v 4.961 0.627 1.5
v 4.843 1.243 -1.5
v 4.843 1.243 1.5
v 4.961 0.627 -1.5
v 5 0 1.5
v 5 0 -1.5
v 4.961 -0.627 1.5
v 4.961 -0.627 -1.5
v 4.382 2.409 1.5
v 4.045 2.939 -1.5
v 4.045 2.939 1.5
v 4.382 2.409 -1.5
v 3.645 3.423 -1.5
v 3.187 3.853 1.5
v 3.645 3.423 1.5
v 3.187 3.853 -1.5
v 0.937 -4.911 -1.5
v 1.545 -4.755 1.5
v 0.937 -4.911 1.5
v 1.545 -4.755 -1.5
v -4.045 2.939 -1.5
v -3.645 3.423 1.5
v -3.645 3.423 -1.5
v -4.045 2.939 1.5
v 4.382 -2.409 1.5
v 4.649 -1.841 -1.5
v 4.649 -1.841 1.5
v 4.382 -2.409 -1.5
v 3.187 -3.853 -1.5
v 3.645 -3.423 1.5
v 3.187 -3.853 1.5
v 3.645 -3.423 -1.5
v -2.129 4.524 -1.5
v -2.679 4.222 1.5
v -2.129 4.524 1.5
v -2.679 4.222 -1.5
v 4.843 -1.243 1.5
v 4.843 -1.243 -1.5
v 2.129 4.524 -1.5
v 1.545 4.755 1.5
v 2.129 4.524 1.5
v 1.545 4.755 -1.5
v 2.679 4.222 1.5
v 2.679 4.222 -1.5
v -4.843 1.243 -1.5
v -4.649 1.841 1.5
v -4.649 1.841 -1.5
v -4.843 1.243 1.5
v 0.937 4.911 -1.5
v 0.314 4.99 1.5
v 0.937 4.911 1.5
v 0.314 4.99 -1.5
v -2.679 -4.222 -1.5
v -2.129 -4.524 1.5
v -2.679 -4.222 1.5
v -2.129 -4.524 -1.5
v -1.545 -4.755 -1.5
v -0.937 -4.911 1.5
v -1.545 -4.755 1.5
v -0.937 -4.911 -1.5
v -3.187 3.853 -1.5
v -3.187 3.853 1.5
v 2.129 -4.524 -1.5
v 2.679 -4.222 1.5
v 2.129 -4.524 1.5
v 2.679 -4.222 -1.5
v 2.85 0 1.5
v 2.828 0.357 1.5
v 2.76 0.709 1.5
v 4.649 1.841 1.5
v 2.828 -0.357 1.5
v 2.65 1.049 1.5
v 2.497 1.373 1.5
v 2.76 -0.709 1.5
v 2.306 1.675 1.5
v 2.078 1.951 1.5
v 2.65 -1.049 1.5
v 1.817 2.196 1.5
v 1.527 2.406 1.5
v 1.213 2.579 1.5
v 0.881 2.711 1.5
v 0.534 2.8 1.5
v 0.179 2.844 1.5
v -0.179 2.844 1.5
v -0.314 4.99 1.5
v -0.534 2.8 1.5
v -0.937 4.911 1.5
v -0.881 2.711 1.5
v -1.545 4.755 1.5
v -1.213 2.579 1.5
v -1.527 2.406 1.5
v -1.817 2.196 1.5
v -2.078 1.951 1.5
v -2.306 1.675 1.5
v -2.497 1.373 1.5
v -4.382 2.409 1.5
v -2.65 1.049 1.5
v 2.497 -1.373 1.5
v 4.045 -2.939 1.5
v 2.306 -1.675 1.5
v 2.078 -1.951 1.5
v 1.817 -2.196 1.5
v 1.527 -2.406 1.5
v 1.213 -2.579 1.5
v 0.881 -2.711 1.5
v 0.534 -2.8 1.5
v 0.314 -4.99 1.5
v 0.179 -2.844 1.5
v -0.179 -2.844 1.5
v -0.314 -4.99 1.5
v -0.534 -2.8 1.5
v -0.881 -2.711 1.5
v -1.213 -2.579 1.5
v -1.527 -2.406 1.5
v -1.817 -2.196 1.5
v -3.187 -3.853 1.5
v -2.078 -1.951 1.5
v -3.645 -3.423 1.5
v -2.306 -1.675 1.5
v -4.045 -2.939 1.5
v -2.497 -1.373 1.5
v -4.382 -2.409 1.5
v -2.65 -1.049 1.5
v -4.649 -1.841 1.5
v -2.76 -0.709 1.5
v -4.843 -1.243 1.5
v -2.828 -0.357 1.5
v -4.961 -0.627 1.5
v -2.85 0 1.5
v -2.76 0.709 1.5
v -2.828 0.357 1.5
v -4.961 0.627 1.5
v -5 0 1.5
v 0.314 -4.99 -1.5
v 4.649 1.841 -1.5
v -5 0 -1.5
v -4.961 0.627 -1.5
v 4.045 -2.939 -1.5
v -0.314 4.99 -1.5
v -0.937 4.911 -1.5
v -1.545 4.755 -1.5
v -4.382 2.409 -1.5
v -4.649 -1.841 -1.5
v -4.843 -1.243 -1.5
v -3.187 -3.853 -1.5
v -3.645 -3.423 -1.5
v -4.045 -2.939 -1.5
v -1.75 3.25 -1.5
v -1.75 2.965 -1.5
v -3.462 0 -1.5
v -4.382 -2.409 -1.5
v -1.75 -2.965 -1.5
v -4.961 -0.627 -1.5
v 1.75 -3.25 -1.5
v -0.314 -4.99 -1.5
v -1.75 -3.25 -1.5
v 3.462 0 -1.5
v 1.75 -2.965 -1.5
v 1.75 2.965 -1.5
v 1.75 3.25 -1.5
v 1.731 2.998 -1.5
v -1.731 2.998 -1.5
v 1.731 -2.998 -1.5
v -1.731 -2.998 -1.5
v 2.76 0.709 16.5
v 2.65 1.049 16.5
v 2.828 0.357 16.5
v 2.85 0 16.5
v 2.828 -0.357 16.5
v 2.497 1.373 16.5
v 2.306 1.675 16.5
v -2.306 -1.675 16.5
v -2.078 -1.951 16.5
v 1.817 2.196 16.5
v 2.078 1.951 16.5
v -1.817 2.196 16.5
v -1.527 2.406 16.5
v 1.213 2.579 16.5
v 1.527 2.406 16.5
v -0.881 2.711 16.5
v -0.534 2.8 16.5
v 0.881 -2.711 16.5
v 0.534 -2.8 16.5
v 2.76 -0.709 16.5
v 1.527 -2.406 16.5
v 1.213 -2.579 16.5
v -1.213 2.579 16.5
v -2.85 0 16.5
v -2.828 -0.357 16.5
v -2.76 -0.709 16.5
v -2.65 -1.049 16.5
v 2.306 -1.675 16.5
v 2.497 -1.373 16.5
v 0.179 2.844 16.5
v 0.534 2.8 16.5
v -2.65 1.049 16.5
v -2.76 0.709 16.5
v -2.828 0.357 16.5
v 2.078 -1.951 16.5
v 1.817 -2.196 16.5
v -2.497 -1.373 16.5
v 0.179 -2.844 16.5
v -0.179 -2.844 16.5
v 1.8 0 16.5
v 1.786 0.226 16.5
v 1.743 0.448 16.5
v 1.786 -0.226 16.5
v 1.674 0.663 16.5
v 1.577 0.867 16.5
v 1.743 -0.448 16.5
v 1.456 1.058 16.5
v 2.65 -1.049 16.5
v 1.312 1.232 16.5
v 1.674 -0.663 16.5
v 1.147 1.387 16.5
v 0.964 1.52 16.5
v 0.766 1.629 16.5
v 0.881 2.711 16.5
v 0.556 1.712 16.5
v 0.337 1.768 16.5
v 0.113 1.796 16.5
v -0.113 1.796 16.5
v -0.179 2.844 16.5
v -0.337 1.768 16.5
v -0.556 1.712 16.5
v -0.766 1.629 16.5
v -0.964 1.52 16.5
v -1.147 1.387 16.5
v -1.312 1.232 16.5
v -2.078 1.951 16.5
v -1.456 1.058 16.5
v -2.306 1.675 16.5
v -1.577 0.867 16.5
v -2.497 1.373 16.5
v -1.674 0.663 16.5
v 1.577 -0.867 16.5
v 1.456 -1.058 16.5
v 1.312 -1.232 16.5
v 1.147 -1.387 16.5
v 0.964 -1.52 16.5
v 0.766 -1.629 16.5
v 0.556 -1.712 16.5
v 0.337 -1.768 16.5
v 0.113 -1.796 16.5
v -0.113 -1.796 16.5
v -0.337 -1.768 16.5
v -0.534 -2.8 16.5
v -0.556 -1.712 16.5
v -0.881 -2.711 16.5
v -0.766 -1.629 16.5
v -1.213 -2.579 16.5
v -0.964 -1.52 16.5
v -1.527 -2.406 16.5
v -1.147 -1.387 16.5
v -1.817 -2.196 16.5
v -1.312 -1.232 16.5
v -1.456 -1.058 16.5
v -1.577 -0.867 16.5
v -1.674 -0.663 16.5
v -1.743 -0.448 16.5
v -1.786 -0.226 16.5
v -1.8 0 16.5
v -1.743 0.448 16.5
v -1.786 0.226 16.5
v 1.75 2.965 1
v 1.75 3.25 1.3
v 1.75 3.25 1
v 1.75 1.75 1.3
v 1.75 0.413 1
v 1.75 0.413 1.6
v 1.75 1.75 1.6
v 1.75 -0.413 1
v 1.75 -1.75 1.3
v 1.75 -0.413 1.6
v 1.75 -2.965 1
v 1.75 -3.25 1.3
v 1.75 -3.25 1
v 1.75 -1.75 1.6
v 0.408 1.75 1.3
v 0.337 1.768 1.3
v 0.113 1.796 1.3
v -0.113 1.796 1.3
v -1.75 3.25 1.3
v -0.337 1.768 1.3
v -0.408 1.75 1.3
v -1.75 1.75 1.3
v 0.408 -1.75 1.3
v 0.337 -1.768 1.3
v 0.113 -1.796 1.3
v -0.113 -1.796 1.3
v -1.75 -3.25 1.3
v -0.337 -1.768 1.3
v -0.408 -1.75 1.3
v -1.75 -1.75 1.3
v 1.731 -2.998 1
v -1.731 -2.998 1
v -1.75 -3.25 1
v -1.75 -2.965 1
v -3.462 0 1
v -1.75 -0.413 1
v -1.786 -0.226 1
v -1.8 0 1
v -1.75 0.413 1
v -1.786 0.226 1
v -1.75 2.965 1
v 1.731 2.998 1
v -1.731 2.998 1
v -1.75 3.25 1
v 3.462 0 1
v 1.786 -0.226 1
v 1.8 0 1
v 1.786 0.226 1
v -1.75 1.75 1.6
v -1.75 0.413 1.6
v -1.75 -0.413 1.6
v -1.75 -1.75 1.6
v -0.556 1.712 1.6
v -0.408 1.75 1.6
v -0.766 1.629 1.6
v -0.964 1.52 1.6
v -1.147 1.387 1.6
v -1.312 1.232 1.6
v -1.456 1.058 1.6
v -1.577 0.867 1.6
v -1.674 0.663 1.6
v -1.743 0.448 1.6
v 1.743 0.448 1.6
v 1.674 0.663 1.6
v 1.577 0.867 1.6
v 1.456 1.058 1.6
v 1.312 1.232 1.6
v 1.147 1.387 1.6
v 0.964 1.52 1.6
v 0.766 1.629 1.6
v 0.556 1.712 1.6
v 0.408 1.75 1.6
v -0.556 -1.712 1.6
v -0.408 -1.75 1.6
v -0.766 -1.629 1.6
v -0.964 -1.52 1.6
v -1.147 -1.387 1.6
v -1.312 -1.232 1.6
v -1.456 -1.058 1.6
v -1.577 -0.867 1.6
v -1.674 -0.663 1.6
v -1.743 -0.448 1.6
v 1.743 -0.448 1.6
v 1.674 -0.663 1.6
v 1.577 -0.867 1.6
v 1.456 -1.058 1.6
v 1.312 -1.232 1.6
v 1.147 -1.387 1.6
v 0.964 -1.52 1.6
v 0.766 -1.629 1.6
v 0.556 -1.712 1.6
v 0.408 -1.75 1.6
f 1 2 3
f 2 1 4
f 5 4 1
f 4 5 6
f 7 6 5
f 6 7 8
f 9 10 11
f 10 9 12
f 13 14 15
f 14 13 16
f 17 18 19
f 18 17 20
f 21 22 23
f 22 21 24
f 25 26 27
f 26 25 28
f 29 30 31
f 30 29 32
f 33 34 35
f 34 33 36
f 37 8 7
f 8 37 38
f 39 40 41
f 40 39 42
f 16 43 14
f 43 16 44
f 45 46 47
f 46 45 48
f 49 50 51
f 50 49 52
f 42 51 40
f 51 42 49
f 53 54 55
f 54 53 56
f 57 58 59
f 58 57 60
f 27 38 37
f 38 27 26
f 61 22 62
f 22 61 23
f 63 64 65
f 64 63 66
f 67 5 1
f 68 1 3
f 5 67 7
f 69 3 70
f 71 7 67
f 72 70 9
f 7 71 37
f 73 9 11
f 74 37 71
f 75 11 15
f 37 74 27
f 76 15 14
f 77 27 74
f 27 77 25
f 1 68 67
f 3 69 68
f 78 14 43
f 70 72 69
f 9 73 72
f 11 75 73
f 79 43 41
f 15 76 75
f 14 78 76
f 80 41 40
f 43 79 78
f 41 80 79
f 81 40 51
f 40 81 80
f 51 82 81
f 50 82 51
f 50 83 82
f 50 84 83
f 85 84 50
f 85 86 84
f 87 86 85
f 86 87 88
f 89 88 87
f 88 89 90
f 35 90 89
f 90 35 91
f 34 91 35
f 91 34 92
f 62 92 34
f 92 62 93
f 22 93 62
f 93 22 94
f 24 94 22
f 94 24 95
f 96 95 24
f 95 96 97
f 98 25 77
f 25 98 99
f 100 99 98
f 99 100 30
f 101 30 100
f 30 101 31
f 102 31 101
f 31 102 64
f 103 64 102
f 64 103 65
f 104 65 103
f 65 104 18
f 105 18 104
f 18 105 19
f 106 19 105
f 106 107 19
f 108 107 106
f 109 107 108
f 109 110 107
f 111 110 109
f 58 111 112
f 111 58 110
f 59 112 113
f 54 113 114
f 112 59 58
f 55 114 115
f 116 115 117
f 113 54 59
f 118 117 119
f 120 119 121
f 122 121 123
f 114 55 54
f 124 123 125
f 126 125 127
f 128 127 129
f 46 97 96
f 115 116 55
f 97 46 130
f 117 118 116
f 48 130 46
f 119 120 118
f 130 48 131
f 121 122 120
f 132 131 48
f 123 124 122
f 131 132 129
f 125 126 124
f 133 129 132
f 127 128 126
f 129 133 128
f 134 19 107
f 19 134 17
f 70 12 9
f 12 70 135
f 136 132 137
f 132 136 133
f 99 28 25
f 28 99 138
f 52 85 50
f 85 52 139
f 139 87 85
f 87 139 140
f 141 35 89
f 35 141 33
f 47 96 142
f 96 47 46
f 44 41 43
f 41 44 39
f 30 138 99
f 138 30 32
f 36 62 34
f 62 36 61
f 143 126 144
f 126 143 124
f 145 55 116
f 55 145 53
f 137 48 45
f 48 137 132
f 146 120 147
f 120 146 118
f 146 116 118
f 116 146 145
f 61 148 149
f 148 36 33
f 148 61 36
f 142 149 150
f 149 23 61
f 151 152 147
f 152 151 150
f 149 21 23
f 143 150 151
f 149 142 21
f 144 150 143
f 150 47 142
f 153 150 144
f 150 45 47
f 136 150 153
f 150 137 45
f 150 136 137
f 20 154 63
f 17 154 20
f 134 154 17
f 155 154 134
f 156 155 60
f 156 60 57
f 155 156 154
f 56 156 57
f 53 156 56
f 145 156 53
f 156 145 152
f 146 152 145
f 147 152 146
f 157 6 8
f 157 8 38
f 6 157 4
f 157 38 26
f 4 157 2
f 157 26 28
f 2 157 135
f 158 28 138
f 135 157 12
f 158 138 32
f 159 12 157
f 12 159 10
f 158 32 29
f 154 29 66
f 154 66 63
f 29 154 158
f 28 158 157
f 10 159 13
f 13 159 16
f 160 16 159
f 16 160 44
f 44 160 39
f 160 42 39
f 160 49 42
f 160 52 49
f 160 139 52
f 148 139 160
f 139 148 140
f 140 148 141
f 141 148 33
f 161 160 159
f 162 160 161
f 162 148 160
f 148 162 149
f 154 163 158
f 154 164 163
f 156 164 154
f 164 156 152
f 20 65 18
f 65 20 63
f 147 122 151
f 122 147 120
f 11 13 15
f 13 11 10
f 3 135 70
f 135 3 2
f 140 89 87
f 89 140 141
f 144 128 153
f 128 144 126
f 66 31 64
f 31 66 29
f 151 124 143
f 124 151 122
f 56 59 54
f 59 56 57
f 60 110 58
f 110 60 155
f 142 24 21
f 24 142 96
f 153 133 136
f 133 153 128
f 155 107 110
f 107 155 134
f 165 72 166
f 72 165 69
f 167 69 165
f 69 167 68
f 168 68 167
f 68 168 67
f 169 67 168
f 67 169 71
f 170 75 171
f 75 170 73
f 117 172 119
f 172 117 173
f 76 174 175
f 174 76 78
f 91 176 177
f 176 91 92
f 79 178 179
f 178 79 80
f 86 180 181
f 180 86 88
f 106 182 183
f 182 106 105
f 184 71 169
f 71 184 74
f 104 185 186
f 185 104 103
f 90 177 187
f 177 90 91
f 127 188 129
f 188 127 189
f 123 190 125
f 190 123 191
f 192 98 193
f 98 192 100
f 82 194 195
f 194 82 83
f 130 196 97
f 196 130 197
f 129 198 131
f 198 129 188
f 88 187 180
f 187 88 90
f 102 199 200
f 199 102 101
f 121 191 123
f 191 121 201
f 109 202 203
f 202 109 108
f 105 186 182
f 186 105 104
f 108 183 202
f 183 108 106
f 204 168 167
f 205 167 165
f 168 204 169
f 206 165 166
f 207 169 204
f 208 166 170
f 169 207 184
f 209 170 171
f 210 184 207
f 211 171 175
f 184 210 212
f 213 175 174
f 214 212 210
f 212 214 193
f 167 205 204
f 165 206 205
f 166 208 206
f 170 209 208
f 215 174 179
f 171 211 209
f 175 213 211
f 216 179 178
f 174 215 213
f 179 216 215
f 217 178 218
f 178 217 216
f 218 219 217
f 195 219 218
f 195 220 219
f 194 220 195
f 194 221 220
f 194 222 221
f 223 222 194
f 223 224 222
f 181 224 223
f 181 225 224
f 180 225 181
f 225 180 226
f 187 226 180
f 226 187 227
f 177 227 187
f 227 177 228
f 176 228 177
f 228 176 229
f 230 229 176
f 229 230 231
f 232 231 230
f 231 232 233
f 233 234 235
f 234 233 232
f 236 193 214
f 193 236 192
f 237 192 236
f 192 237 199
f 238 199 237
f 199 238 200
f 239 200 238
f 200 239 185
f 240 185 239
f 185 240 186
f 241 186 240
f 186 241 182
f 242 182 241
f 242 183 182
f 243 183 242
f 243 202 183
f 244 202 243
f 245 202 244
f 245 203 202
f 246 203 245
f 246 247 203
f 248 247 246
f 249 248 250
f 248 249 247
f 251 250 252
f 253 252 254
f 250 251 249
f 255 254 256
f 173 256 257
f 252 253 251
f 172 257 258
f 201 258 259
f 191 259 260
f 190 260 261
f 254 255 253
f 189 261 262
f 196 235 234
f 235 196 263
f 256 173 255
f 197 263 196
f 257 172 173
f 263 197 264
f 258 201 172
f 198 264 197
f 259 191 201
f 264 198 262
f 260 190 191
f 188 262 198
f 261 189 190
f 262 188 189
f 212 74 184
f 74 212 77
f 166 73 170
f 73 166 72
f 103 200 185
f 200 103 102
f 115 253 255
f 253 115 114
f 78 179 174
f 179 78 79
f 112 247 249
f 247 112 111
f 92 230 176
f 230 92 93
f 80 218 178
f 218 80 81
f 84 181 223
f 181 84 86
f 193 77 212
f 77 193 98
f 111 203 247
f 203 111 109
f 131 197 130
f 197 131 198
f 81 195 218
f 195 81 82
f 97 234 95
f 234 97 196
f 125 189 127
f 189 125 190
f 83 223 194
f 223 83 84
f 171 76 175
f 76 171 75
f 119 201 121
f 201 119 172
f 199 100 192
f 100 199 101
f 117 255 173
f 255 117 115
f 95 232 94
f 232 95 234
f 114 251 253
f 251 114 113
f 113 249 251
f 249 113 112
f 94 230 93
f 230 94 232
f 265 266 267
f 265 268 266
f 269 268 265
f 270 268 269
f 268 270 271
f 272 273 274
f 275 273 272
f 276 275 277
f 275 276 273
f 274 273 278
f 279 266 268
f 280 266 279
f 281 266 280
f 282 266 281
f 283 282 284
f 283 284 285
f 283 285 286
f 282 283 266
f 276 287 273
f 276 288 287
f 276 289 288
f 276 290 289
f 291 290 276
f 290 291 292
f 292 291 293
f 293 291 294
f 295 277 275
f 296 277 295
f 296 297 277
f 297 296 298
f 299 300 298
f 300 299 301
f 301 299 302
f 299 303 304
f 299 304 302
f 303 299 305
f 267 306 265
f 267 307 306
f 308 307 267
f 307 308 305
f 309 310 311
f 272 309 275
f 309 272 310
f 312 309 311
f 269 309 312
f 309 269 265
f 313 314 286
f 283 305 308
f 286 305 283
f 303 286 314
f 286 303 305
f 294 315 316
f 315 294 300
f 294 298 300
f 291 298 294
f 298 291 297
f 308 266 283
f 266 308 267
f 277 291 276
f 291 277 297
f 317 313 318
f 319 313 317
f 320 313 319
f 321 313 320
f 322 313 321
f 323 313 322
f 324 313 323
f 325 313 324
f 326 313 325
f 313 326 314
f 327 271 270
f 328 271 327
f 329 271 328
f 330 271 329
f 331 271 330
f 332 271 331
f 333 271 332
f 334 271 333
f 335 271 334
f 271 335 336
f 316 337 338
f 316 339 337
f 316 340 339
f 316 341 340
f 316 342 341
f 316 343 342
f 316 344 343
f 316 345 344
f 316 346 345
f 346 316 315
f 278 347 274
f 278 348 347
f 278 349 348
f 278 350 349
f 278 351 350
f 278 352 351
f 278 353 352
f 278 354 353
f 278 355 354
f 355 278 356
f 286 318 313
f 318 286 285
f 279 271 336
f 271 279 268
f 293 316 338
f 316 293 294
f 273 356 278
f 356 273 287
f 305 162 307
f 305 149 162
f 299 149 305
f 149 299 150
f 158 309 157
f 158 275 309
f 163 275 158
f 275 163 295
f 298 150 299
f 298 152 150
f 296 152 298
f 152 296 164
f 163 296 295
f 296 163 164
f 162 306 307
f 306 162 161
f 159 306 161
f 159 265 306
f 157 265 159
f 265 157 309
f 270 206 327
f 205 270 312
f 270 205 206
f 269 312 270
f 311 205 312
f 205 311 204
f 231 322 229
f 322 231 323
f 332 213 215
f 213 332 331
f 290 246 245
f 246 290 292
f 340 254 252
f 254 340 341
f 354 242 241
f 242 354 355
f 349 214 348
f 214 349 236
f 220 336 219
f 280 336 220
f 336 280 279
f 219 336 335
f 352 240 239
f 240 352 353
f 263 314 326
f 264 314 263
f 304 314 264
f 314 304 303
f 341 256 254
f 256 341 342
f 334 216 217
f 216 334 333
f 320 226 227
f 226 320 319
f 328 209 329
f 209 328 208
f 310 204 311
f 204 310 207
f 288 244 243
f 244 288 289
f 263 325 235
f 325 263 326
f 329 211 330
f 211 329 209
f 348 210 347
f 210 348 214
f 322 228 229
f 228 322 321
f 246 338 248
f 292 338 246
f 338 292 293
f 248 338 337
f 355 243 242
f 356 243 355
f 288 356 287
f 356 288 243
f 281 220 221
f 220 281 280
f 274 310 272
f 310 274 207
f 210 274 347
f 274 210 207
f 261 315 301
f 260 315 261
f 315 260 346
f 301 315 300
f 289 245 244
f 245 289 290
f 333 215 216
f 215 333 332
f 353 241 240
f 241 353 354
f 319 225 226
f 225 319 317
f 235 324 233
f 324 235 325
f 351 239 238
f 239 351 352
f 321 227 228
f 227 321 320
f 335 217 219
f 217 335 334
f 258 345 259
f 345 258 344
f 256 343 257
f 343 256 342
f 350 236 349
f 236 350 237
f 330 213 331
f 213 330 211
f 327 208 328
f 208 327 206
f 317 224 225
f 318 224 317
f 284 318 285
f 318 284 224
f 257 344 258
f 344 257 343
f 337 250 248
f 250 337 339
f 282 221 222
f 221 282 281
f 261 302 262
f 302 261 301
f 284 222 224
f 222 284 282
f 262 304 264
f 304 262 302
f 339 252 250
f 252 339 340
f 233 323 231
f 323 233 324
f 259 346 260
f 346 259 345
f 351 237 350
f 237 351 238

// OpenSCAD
$fn = 50;


difference() {
	union() {
		translate(v = [0, 0, -1.5000000000]) {
			cylinder(h = 3, r = 5.0000000000);
		}
		translate(v = [0, 0, -1.5000000000]) {
			cylinder(h = 18, r = 2.8500000000);
		}
	}
	union() {
		translate(v = [0, 0, -1.5000000000]) {
			rotate(a = [0, 0, 0]) {
				difference() {
					union() {
						translate(v = [-1.7500000000, -3.2500000000, -0.3000000000]) {
							cube(size = [3.5000000000, 6.5000000000, 0.3000000000]);
						}
						translate(v = [-1.7500000000, -1.7500000000, -0.6000000000]) {
							cube(size = [3.5000000000, 3.5000000000, 0.3000000000]);
						}
						translate(v = [-1.7500000000, -3.2500000000, 2.5000000000]) {
							cube(size = [3.5000000000, 6.5000000000, 0.3000000000]);
						}
						translate(v = [-1.7500000000, -1.7500000000, 2.8000000000]) {
							cube(size = [3.5000000000, 3.5000000000, 0.3000000000]);
						}
						linear_extrude(height = 2.5000000000) {
							polygon(points = [[3.4620000000, 0.0000000000], [1.7310000000, 2.9981799479], [-1.7310000000, 2.9981799479], [-3.4620000000, 0.0000000000], [-1.7310000000, -2.9981799479], [1.7310000000, -2.9981799479]]);
						}
						translate(v = [-1.7500000000, -3.2500000000, -0.3000000000]) {
							cube(size = [3.5000000000, 6.5000000000, 0.3000000000]);
						}
						translate(v = [-1.7500000000, -1.7500000000, -0.6000000000]) {
							cube(size = [3.5000000000, 3.5000000000, 0.3000000000]);
						}
						translate(v = [-1.7500000000, -3.2500000000, 2.5000000000]) {
							cube(size = [3.5000000000, 6.5000000000, 0.3000000000]);
						}
						translate(v = [-1.7500000000, -1.7500000000, 2.8000000000]) {
							cube(size = [3.5000000000, 3.5000000000, 0.3000000000]);
						}
						translate(v = [-1.7500000000, -3.2500000000, -0.3000000000]) {
							cube(size = [3.5000000000, 6.5000000000, 0.3000000000]);
						}
						translate(v = [-1.7500000000, -1.7500000000, -0.6000000000]) {
							cube(size = [3.5000000000, 3.5000000000, 0.3000000000]);
						}
						translate(v = [-1.7500000000, -3.2500000000, 2.5000000000]) {
							cube(size = [3.5000000000, 6.5000000000, 0.3000000000]);
						}
						translate(v = [-1.7500000000, -1.7500000000, 2.8000000000]) {
							cube(size = [3.5000000000, 3.5000000000, 0.3000000000]);
						}
					}
					union();
				}
			}
		}
		translate(v = [0, 0, -100.0000000000]) {
			cylinder(h = 200, r = 1.8000000000);
		}
	}
}
